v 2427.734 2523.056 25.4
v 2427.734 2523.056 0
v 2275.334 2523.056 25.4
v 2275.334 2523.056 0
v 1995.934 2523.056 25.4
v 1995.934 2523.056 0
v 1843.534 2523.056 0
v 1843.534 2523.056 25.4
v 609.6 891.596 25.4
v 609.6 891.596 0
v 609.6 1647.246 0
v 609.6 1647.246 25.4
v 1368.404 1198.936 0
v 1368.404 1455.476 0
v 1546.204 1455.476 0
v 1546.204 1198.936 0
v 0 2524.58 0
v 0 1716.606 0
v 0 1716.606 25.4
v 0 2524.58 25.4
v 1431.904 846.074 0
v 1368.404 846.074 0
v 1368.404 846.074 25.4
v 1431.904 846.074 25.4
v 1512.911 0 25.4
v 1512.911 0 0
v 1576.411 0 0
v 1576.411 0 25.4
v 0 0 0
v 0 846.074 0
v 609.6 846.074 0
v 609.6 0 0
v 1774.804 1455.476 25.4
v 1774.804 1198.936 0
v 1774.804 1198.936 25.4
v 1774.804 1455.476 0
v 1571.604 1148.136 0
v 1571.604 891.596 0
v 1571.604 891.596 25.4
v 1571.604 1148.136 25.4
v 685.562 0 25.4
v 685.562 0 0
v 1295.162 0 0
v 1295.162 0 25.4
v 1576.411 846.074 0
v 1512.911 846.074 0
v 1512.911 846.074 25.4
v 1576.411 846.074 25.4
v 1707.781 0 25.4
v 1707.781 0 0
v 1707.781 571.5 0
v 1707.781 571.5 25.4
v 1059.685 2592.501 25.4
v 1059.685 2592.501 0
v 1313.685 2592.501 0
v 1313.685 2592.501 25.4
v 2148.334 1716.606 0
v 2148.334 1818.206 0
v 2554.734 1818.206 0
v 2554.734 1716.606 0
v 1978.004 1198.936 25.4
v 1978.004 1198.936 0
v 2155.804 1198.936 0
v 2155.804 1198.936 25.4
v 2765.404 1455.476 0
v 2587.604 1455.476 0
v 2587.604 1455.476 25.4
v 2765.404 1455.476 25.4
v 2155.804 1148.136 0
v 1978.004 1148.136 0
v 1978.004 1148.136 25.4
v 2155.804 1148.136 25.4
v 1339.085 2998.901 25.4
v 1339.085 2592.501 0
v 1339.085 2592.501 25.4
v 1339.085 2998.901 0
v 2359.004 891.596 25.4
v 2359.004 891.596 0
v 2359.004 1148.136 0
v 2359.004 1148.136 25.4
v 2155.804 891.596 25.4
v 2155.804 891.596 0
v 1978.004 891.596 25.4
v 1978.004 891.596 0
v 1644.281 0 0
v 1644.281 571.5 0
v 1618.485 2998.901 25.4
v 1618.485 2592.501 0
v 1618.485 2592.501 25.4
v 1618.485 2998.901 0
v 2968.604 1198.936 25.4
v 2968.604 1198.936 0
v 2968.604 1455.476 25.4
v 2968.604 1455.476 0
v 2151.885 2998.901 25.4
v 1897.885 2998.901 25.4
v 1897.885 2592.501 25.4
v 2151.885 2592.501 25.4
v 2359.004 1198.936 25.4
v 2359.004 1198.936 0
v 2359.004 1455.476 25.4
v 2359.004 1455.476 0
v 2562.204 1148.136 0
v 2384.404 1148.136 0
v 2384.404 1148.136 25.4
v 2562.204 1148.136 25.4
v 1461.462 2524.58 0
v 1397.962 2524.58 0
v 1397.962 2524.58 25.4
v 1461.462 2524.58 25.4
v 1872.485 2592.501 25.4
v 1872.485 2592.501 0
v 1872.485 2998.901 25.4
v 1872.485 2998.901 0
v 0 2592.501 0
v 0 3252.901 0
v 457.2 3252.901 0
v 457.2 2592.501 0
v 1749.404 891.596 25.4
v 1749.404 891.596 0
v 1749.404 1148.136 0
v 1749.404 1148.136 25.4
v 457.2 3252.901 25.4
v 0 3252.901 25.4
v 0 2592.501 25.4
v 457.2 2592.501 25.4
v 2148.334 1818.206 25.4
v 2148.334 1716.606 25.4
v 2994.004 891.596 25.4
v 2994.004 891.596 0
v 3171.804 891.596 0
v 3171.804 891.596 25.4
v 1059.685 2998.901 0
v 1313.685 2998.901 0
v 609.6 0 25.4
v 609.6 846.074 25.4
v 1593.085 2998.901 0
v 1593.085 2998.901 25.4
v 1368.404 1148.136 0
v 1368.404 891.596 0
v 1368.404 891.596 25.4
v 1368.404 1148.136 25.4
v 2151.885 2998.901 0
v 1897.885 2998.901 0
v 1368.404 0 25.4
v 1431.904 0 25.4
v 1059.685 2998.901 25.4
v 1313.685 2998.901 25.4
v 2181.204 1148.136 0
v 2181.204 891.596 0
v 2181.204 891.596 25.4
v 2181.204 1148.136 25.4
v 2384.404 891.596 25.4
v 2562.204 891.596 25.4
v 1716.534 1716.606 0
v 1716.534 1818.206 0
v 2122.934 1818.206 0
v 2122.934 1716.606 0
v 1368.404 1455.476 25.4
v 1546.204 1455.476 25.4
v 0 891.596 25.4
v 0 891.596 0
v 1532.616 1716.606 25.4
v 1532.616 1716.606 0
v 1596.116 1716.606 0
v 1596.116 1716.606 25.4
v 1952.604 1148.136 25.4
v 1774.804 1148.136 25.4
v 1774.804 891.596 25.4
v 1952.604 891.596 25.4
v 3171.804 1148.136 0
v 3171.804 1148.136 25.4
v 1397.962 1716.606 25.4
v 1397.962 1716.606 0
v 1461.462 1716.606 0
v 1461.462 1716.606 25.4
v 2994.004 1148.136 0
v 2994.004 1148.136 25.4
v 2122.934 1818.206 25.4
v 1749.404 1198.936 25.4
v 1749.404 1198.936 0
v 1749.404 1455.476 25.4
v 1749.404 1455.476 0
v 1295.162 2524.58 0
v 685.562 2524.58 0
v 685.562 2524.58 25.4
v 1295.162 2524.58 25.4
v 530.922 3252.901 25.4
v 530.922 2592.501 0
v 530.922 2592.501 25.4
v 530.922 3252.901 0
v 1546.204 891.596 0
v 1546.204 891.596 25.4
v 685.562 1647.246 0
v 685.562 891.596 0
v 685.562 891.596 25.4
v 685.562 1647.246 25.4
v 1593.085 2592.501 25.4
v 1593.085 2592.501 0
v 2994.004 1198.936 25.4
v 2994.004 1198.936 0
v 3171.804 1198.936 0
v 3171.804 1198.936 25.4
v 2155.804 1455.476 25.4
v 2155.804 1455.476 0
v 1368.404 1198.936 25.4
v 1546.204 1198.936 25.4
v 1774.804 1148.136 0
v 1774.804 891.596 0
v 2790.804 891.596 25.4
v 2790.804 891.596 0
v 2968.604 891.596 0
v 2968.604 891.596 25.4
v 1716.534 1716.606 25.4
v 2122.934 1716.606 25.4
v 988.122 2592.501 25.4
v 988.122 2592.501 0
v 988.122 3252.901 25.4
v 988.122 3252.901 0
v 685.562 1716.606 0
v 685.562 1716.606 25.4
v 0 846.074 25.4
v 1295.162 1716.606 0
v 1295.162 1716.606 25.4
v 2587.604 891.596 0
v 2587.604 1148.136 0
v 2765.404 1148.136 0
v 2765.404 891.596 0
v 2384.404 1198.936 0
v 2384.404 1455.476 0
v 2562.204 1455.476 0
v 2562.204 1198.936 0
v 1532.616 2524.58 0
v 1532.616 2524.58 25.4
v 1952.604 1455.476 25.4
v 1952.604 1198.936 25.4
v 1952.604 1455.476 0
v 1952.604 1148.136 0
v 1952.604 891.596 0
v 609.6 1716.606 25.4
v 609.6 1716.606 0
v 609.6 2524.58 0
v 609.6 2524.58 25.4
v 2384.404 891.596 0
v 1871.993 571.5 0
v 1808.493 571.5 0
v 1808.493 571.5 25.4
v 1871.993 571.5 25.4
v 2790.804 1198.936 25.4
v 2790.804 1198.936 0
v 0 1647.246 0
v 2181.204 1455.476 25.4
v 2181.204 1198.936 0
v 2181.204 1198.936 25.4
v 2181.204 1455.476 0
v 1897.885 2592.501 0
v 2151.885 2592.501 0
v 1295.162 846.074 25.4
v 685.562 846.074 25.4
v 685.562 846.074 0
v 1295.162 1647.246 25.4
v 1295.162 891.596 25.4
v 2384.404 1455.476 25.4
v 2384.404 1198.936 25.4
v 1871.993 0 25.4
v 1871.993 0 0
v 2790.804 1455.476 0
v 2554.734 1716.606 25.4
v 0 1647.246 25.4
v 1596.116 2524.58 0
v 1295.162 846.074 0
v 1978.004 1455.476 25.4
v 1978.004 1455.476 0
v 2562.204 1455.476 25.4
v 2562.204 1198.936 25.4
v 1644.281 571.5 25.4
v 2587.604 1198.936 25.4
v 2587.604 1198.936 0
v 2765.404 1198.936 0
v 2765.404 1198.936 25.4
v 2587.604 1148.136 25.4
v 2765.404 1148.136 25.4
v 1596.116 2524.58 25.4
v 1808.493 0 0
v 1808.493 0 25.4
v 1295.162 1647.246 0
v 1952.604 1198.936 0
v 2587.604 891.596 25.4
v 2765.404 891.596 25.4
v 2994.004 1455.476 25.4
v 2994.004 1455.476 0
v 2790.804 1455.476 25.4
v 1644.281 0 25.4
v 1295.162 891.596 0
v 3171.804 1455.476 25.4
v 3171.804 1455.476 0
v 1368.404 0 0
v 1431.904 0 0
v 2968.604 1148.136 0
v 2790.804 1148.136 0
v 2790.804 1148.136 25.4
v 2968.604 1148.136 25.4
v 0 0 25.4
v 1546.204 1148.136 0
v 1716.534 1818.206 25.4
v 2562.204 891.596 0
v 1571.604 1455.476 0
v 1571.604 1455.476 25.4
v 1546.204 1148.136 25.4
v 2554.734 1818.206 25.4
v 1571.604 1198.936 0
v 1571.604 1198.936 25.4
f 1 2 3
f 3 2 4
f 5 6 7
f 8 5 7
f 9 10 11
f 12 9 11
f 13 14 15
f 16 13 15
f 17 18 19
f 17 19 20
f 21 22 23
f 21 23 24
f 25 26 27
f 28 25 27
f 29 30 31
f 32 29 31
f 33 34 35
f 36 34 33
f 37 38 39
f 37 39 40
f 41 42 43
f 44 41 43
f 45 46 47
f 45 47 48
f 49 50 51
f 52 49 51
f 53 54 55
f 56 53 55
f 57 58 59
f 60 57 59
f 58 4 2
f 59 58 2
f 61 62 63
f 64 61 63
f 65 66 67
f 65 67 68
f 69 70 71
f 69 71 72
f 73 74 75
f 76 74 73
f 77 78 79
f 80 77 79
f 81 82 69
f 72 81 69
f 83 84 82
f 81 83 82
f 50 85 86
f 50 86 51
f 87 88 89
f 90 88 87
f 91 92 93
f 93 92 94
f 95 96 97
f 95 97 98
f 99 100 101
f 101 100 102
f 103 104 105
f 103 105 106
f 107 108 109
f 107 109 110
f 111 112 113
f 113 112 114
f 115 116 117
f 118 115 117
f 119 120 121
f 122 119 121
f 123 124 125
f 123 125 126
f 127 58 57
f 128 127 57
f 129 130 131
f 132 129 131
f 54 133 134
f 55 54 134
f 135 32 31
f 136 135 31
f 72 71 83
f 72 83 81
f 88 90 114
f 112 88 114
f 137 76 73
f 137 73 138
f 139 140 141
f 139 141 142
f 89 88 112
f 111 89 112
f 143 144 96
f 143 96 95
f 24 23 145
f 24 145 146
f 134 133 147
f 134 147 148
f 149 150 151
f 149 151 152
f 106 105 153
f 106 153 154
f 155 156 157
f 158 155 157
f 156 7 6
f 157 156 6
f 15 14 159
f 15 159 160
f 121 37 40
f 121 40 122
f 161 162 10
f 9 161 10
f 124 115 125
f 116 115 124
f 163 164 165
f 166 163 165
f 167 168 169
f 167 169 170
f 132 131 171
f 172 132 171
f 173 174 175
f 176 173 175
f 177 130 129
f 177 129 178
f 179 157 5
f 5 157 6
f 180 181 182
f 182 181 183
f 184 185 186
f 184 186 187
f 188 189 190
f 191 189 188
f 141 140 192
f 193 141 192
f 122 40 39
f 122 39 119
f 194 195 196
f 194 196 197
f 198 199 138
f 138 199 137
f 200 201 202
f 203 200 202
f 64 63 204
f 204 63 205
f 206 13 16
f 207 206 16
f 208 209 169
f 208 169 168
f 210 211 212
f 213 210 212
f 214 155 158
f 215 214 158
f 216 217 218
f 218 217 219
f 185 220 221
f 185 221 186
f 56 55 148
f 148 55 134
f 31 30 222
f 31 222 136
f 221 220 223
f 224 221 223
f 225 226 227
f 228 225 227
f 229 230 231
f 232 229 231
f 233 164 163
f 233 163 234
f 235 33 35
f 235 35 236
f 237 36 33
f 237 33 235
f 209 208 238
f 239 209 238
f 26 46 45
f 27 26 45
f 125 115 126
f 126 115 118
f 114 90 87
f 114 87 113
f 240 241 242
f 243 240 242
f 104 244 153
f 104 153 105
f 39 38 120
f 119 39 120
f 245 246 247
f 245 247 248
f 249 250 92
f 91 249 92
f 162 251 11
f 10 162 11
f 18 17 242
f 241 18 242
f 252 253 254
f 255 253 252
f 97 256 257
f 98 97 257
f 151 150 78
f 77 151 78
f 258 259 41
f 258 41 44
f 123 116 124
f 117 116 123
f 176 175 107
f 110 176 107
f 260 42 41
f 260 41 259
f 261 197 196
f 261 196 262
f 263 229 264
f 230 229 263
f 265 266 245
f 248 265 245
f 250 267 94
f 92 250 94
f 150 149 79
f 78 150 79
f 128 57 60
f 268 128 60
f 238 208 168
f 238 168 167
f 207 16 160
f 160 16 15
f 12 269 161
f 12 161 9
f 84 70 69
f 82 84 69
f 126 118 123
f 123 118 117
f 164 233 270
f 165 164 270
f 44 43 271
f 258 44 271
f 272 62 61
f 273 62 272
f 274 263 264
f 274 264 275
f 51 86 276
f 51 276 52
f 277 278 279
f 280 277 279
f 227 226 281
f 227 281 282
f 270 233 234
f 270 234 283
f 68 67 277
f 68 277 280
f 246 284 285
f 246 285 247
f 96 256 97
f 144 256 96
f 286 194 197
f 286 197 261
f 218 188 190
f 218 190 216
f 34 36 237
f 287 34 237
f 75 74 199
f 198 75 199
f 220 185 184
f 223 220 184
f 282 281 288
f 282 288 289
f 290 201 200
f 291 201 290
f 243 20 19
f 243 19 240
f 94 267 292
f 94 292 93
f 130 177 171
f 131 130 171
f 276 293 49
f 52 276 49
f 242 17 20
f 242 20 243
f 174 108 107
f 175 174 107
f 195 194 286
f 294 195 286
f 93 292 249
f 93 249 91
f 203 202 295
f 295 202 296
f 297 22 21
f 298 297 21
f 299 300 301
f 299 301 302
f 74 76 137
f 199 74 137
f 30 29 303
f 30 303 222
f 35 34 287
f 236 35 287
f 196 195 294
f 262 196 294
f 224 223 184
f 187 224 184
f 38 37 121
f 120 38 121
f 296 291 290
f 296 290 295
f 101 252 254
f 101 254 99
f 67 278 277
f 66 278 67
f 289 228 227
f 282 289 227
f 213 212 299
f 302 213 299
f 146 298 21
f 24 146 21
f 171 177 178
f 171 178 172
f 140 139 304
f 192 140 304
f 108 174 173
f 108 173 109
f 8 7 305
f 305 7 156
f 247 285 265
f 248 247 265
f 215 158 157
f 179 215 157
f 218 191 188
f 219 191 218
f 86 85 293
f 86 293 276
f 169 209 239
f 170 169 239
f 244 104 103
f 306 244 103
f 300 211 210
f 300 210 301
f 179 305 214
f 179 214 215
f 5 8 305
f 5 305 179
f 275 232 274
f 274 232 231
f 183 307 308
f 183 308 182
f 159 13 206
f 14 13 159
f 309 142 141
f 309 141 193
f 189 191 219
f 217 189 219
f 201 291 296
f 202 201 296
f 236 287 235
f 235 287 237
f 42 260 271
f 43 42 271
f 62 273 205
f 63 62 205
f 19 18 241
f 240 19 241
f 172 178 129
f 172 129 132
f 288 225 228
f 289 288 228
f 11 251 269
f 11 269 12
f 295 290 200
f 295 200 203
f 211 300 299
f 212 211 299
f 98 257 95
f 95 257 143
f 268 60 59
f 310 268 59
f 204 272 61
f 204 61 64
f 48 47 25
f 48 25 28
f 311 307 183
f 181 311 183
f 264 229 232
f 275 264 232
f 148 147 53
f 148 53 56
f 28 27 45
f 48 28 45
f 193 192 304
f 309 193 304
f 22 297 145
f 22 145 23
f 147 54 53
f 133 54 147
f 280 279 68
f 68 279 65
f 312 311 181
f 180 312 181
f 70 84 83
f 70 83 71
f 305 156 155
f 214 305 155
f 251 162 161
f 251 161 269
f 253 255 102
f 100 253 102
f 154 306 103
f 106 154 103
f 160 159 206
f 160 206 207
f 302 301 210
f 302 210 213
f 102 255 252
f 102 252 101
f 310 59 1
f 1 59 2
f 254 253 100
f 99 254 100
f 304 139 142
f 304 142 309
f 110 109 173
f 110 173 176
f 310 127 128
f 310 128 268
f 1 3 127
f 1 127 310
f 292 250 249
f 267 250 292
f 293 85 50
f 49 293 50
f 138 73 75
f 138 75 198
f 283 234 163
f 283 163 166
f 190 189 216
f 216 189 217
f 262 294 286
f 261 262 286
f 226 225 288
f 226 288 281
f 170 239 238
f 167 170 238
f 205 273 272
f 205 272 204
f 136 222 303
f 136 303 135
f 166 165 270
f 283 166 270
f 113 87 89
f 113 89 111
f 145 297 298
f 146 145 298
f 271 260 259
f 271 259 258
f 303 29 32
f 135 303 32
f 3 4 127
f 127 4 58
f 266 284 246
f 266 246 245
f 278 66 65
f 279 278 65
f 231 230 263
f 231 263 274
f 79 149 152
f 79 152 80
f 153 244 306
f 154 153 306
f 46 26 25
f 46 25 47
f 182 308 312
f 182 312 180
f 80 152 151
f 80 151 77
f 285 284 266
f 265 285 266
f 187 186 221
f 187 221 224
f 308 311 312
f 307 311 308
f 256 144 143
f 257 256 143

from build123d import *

# Parameters (mm, degrees)
F0_W     = 609.6
F0_H     = 846.074
F0_H_2   = 755.65
F0_H_3   = 807.974
F0_W_2   = 63.5
F0_H_4   = 571.5
F0_W_3   = 177.8
F0_H_5   = 256.54
F0_W_4   = 457.2
F0_H_6   = 660.4
F0_W_5   = 254
F0_H_7   = 406.4
F1_DEPTH = 25.4


with BuildPart() as f1:
    # F0 (on Top) → F1 (new body)
    with BuildSketch(Plane.XY):
        with Locations((304.8, 423.037)):
            Rectangle(F0_W, F0_H)
        with Locations((990.362193, 423.037)):
            Rectangle(F0_W, F0_H)
        with Locations((304.8, 1269.421138)):
            Rectangle(F0_W, F0_H_2)
        with Locations((990.362193, 1269.421138)):
            Rectangle(F0_W, F0_H_2)
        with Locations((304.8, 2120.593259)):
            Rectangle(F0_W, F0_H_3)
        with Locations((990.362193, 2120.593259)):
            Rectangle(F0_W, F0_H_3)
        with Locations((1429.712332, 2120.593259)):
            Rectangle(F0_W_2, F0_H_3)
        with Locations((1564.366258, 2120.593259)):
            Rectangle(F0_W_2, F0_H_3)
        with Locations((1400.154031, 423.037)):
            Rectangle(F0_W_2, F0_H)
        with Locations((1544.660843, 423.037)):
            Rectangle(F0_W_2, F0_H)
        with Locations((1676.030553, 285.75)):
            Rectangle(F0_W_2, F0_H_4)
        with Locations((1840.24278, 285.75)):
            Rectangle(F0_W_2, F0_H_4)
        with Locations((1457.304031, 1019.866138)):
            Rectangle(F0_W_3, F0_H_5)
        with Locations((1457.304031, 1327.206138)):
            Rectangle(F0_W_3, F0_H_5)
        with Locations((1660.504031, 1019.866138)):
            Rectangle(F0_W_3, F0_H_5)
        with Locations((1660.504031, 1327.206138)):
            Rectangle(F0_W_3, F0_H_5)
        with Locations((1863.704031, 1019.866138)):
            Rectangle(F0_W_3, F0_H_5)
        with Locations((1863.704031, 1327.206138)):
            Rectangle(F0_W_3, F0_H_5)
        with Locations((2066.904031, 1019.866138)):
            Rectangle(F0_W_3, F0_H_5)
        with Locations((2066.904031, 1327.206138)):
            Rectangle(F0_W_3, F0_H_5)
        with Locations((2270.104031, 1019.866138)):
            Rectangle(F0_W_3, F0_H_5)
        with Locations((2270.104031, 1327.206138)):
            Rectangle(F0_W_3, F0_H_5)
        with Locations((2473.304031, 1019.866138)):
            Rectangle(F0_W_3, F0_H_5)
        with Locations((2473.304031, 1327.206138)):
            Rectangle(F0_W_3, F0_H_5)
        with Locations((2676.504031, 1019.866138)):
            Rectangle(F0_W_3, F0_H_5)
        with Locations((2676.504031, 1327.206138)):
            Rectangle(F0_W_3, F0_H_5)
        with Locations((2879.704031, 1019.866138)):
            Rectangle(F0_W_3, F0_H_5)
        with Locations((2879.704031, 1327.206138)):
            Rectangle(F0_W_3, F0_H_5)
        with Locations((3082.904031, 1019.866138)):
            Rectangle(F0_W_3, F0_H_5)
        with Locations((3082.904031, 1327.206138)):
            Rectangle(F0_W_3, F0_H_5)
        with Locations((228.6, 2922.701163)):
            Rectangle(F0_W_4, F0_H_6)
        with Locations((759.521876, 2922.701163)):
            Rectangle(F0_W_4, F0_H_6)
        with Locations((1186.685111, 2795.701163)):
            Rectangle(F0_W_5, F0_H_7)
        with Locations((1466.085111, 2795.701163)):
            Rectangle(F0_W_5, F0_H_7)
        with Locations((1745.485111, 2795.701163)):
            Rectangle(F0_W_5, F0_H_7)
        with Locations((2024.885111, 2795.701163)):
            Rectangle(F0_W_5, F0_H_7)
        Polygon((1716.533899, 1818.206259), (1716.533899, 1716.606259), (2122.933899, 1716.606259), (2122.933899, 1818.206259), (1995.933899, 2523.056259), (1843.533899, 2523.056259), align=None)
        Polygon((2148.333899, 1818.206259), (2148.333899, 1716.606259), (2554.733899, 1716.606259), (2554.733899, 1818.206259), (2427.733899, 2523.056259), (2275.333899, 2523.056259), align=None)
    extrude(amount=F1_DEPTH)


solid = f1.part
